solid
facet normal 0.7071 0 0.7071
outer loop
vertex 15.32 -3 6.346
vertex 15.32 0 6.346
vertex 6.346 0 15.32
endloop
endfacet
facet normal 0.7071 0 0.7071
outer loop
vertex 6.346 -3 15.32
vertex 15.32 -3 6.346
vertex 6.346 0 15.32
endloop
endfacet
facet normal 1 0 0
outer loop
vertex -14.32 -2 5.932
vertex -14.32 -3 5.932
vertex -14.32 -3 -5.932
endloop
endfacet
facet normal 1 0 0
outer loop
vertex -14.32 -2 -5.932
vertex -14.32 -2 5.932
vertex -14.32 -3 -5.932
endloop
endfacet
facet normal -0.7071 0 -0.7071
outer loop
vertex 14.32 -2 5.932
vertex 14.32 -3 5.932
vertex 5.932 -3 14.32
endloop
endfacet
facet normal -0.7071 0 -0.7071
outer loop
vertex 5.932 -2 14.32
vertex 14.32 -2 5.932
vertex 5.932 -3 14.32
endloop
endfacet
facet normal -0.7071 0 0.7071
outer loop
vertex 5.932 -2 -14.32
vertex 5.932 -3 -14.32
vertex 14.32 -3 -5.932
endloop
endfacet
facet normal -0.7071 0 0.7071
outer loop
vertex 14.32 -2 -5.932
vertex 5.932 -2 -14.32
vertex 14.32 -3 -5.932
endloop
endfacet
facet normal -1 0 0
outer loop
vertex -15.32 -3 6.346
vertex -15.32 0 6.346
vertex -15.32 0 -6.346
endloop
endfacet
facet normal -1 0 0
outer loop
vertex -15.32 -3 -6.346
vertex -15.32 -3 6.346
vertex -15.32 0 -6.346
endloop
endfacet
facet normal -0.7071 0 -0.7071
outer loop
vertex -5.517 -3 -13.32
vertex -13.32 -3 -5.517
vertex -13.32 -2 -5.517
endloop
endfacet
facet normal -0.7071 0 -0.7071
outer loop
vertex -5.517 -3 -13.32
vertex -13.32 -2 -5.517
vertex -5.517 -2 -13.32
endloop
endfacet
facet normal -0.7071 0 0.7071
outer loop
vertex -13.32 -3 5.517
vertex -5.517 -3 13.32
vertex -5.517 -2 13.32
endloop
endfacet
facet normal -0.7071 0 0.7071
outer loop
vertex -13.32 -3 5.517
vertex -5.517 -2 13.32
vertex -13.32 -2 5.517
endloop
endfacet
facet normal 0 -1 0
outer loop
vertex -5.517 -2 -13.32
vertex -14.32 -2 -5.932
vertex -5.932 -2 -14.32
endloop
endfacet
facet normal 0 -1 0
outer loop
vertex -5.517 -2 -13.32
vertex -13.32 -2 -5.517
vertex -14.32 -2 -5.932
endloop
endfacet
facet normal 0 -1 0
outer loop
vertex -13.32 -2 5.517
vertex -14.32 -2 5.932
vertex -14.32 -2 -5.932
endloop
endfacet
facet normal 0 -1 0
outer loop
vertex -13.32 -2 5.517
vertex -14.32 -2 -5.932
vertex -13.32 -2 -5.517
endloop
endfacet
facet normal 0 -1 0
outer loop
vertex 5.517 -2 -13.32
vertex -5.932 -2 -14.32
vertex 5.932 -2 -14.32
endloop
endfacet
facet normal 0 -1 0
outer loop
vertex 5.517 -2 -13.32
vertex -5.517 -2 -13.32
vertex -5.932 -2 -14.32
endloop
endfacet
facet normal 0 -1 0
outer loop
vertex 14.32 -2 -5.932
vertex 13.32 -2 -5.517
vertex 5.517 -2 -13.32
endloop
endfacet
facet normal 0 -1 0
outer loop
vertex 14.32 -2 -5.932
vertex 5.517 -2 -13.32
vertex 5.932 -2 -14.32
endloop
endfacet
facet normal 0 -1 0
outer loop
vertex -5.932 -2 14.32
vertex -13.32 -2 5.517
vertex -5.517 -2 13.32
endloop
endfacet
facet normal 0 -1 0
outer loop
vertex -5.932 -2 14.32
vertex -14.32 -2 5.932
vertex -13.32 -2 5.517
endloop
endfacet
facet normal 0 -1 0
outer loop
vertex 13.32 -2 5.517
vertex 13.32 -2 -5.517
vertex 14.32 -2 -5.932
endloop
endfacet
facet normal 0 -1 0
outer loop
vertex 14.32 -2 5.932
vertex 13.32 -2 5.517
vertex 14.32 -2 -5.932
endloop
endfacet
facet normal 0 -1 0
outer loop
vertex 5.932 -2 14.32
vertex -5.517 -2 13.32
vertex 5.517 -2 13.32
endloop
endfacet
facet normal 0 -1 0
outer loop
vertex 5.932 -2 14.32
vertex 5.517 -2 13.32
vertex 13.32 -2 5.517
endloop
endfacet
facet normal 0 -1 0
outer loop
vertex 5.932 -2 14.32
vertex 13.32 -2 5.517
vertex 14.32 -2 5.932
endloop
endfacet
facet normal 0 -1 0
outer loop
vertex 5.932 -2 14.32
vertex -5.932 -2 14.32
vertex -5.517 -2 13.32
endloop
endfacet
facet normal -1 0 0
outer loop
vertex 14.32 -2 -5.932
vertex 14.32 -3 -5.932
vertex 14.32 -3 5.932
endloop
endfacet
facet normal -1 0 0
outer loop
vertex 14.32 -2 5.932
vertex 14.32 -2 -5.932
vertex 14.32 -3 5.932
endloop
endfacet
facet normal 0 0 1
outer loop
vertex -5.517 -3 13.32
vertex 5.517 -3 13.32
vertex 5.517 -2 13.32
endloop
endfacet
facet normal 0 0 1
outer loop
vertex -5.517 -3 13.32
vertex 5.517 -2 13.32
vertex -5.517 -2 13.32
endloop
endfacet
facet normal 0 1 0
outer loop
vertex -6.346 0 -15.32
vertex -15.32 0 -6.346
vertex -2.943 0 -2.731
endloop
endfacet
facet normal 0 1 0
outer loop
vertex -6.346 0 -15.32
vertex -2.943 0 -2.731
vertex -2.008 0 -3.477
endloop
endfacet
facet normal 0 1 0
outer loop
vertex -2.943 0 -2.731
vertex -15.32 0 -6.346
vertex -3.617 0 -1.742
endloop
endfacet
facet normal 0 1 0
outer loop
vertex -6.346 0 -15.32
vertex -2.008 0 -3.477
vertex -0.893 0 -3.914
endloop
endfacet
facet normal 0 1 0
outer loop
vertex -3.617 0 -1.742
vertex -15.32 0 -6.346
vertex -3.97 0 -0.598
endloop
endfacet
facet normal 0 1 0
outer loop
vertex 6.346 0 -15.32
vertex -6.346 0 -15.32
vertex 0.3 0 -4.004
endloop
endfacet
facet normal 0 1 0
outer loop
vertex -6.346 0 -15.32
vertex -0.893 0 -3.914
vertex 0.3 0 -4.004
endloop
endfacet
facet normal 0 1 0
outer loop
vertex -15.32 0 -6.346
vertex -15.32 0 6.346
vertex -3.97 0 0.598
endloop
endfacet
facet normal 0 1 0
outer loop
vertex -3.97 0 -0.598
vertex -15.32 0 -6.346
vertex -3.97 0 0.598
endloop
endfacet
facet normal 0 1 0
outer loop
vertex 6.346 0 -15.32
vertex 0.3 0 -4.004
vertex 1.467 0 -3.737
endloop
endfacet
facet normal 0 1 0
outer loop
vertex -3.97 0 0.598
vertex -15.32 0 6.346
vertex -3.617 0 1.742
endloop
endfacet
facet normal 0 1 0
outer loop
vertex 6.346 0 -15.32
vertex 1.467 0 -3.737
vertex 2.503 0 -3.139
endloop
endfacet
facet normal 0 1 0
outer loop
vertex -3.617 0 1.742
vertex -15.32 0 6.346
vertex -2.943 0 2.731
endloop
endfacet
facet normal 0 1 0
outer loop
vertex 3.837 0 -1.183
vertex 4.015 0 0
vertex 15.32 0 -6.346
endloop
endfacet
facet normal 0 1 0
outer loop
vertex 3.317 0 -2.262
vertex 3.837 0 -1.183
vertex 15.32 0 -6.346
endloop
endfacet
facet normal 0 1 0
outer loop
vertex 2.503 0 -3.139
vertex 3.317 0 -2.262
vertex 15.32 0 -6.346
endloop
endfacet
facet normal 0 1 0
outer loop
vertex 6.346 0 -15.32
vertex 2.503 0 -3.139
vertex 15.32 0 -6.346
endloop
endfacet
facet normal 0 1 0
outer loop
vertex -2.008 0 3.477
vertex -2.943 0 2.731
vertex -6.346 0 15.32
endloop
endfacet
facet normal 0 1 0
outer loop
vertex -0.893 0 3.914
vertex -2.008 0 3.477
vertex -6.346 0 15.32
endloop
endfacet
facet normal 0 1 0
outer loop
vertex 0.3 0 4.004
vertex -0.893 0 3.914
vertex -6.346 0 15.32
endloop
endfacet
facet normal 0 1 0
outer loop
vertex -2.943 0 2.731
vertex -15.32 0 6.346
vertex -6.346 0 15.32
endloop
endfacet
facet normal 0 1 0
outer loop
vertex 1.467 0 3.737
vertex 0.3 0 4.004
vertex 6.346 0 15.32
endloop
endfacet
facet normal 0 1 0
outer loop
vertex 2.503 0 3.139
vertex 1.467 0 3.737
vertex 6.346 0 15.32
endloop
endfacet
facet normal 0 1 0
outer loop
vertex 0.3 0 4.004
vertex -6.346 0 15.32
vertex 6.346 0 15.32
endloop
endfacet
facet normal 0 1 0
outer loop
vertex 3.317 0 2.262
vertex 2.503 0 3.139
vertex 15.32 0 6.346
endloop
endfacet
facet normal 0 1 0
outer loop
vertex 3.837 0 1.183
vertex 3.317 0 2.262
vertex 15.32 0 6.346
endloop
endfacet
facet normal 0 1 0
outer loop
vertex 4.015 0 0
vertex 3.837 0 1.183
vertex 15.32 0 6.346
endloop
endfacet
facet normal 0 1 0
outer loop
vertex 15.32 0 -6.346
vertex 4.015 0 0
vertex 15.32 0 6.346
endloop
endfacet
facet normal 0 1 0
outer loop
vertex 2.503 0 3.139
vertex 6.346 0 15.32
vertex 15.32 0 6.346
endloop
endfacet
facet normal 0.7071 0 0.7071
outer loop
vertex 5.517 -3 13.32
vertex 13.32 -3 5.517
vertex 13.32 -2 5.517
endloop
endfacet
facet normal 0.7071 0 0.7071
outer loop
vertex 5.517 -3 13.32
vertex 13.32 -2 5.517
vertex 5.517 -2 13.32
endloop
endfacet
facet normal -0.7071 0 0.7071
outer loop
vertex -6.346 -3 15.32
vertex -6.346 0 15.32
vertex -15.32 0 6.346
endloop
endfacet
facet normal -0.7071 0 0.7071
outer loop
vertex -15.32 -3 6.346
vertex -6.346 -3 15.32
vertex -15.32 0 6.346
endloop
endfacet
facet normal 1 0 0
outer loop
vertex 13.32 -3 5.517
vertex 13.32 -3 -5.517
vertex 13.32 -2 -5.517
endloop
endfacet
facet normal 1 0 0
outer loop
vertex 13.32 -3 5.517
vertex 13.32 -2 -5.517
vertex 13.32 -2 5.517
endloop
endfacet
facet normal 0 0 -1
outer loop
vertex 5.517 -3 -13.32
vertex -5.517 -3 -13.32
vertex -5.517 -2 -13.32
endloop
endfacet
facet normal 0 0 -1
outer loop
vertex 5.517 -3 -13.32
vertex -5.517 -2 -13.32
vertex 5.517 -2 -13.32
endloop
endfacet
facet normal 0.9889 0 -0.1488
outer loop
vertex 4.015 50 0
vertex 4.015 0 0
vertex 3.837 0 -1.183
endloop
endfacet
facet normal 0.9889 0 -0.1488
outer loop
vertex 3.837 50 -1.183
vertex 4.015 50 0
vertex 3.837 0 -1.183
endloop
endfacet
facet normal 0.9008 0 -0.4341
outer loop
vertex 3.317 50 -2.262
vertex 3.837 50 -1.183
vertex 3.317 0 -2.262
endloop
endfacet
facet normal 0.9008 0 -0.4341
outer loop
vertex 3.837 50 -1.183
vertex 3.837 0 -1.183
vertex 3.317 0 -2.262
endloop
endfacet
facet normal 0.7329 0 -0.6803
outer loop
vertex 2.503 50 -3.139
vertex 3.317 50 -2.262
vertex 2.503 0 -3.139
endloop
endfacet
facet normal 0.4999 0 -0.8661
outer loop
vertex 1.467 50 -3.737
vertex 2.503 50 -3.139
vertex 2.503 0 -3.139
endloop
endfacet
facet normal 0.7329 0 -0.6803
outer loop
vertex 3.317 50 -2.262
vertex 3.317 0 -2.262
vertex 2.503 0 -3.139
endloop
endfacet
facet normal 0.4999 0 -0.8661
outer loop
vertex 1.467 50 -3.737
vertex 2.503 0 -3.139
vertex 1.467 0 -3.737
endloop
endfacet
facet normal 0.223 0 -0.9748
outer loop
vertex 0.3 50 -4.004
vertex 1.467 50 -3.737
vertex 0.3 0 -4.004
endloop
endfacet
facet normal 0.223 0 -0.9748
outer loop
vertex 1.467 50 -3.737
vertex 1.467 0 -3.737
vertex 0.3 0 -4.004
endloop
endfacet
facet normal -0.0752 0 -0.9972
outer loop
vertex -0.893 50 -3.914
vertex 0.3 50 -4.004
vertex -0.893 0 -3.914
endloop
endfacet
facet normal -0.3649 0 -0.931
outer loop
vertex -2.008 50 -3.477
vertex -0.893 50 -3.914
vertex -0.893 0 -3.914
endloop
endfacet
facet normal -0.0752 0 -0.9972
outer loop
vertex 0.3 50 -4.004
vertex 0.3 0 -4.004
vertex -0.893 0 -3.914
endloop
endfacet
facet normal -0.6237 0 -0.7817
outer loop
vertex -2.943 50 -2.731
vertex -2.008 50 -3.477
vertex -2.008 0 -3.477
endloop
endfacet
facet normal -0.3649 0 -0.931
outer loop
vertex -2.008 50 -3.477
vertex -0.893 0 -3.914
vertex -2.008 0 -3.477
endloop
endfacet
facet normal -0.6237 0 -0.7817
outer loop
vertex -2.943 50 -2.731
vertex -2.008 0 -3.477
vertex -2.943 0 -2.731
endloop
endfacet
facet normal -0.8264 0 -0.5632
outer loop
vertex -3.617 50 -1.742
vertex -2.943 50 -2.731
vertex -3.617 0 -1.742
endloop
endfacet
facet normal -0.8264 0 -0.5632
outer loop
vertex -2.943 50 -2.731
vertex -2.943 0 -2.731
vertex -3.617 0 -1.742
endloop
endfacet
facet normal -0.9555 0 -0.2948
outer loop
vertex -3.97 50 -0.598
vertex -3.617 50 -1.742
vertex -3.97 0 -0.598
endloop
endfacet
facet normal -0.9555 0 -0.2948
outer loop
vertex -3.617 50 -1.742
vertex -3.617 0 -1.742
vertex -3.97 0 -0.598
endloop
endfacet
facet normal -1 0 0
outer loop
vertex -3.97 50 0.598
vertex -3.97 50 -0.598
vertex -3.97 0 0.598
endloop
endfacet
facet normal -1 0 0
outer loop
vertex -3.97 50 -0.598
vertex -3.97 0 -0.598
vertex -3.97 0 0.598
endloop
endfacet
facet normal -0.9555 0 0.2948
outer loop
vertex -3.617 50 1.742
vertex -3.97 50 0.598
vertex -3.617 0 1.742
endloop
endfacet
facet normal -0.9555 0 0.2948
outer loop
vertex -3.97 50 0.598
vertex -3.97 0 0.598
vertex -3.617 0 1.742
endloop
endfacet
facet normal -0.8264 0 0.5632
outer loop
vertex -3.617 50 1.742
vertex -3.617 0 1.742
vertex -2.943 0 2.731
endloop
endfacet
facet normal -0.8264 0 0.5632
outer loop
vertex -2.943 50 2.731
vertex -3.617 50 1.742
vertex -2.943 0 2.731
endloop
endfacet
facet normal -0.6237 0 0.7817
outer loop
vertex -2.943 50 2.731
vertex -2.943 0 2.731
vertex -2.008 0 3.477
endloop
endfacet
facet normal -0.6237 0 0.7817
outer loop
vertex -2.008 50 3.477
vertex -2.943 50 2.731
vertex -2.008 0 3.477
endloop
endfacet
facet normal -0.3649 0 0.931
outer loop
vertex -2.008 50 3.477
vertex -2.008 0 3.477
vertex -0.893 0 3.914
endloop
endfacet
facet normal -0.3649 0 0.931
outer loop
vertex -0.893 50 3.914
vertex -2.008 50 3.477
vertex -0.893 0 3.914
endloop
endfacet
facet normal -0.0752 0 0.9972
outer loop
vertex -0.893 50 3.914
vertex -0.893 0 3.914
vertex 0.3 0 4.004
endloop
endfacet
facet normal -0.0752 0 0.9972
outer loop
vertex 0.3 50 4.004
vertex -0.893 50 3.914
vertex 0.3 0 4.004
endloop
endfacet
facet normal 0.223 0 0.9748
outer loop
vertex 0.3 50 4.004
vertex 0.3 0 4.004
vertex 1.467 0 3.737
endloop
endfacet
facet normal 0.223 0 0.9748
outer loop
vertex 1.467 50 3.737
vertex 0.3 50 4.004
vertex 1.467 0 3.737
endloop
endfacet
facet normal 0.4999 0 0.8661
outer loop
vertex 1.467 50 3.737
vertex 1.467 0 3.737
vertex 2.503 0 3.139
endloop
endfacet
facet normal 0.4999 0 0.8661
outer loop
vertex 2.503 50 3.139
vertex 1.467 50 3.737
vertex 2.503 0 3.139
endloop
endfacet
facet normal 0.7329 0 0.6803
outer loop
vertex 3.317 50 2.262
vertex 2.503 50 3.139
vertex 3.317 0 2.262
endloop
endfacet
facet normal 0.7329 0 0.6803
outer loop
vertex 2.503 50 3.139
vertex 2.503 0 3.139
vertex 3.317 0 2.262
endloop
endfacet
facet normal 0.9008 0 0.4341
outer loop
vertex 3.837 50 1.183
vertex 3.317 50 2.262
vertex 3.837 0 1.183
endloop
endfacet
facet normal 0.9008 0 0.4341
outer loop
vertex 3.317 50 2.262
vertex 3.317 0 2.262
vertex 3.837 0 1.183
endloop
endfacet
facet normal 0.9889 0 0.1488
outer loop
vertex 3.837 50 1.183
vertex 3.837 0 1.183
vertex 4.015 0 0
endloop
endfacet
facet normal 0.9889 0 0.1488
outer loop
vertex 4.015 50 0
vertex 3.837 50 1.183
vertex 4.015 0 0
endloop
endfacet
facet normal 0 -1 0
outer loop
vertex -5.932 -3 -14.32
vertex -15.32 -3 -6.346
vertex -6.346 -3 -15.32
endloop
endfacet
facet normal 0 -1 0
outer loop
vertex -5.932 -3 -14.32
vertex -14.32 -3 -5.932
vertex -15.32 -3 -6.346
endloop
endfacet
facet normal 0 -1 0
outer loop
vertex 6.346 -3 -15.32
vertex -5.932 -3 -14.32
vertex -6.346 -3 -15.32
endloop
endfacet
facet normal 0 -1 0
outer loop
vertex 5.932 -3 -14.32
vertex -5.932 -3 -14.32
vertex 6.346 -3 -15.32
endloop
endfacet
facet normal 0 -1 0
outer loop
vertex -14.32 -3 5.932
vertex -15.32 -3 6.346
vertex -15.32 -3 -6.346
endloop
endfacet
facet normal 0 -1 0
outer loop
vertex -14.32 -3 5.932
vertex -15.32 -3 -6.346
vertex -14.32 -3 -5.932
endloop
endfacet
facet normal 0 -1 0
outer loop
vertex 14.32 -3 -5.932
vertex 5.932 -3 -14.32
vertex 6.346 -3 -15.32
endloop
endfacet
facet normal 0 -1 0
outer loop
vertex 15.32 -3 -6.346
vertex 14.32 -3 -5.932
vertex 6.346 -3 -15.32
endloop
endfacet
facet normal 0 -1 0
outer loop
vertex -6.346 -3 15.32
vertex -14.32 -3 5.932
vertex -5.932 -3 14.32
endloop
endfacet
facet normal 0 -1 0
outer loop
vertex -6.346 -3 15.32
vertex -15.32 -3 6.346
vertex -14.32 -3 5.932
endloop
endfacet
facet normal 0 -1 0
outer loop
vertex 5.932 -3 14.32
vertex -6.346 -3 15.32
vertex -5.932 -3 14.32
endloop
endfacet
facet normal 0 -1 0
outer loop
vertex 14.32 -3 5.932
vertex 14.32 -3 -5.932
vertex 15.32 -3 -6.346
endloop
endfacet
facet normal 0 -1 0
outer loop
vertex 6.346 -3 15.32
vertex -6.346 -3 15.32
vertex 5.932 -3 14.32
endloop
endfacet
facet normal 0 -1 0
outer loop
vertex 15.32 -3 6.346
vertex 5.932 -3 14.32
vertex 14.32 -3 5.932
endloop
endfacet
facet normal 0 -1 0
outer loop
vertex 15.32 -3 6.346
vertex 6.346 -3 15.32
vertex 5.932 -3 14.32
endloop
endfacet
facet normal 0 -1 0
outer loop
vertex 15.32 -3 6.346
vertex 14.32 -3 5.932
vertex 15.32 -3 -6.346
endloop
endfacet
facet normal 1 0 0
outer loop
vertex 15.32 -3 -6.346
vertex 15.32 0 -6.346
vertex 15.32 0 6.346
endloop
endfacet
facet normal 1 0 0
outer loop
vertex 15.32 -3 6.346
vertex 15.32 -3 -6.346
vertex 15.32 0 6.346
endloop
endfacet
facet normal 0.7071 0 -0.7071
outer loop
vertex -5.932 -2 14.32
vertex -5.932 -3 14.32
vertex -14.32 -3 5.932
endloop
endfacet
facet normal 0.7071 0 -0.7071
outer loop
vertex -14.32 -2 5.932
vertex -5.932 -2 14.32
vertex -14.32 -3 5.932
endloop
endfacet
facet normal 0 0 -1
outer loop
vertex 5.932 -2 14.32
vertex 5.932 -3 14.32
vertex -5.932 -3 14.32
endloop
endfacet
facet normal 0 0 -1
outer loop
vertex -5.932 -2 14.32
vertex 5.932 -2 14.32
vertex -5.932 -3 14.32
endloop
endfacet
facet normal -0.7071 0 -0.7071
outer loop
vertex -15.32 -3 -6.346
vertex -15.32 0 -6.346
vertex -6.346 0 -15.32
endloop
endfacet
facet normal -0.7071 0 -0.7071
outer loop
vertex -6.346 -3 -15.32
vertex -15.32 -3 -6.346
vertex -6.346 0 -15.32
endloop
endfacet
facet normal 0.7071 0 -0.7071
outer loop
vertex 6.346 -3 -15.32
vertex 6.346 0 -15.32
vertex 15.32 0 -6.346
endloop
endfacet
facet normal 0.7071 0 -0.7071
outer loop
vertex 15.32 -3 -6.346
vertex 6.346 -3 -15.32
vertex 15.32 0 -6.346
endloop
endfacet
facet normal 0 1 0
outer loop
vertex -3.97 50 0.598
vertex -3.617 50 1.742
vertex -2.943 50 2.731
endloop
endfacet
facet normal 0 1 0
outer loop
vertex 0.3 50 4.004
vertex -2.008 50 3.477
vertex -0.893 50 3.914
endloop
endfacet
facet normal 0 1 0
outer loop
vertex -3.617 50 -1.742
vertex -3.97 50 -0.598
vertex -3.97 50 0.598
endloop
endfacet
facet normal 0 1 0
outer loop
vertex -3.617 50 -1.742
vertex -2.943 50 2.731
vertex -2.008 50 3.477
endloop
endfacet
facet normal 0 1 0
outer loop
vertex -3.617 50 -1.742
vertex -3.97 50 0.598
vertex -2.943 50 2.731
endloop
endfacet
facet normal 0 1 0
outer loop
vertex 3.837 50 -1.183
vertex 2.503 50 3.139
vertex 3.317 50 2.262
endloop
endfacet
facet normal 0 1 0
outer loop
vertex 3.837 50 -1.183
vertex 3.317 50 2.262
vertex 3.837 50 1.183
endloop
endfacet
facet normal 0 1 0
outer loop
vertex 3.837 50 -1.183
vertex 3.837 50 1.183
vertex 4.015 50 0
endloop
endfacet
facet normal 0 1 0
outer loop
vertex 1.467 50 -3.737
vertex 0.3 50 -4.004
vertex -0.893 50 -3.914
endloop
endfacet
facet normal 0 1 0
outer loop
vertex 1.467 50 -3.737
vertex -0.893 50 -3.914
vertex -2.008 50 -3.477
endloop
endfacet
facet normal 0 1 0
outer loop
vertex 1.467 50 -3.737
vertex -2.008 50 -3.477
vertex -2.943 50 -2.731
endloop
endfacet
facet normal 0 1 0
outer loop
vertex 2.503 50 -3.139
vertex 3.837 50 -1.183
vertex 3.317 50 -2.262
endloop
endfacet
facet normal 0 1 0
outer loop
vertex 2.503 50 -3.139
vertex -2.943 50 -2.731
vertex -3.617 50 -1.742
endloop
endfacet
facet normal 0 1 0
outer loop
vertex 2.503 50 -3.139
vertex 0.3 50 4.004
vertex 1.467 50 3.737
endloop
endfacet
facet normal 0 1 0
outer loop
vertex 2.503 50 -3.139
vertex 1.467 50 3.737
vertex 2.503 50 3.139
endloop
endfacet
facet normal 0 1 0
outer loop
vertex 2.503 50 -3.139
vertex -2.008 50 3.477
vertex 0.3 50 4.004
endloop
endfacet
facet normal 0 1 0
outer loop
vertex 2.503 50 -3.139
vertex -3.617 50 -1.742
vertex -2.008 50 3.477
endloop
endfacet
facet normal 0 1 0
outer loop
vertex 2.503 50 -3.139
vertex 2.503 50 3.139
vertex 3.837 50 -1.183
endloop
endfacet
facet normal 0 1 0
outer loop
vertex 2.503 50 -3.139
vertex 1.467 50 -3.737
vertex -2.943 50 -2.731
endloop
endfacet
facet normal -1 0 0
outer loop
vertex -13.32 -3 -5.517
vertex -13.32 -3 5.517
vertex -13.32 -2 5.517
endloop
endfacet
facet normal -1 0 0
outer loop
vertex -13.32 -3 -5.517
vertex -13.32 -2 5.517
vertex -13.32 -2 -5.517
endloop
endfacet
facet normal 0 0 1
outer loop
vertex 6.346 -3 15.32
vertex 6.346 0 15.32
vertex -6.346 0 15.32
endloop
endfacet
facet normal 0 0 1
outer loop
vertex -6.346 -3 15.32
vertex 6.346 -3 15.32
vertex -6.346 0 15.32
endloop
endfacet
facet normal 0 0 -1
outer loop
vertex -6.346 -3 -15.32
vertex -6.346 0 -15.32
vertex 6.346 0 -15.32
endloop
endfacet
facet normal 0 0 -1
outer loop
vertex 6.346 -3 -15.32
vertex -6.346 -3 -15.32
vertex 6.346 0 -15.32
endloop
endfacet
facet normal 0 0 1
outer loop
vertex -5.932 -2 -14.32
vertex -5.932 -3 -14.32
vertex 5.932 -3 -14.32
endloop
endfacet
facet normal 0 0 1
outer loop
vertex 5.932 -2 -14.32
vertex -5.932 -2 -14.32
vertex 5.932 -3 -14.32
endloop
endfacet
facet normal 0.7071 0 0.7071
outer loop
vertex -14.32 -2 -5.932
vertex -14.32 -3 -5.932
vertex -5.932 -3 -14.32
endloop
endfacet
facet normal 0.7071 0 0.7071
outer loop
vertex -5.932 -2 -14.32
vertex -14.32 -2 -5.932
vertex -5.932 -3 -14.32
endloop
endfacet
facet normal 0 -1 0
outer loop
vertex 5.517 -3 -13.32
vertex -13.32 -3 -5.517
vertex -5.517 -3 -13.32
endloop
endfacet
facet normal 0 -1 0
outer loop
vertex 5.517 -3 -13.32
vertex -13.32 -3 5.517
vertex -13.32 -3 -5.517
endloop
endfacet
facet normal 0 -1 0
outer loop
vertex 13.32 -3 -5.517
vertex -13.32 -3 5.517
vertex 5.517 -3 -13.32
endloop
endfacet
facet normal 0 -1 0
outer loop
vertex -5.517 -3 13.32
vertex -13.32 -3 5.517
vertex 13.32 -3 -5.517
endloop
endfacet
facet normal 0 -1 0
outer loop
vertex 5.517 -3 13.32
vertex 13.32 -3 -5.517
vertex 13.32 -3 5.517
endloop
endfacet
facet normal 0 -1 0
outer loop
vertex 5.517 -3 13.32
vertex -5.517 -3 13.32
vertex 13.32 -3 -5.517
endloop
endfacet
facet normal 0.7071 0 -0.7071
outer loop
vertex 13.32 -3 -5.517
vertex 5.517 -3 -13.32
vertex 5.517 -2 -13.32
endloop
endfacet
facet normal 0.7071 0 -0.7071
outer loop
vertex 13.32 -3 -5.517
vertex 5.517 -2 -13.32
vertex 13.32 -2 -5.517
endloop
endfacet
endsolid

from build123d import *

# Parameters (mm, degrees)
SKETCH_1_R          = 4.015
EXTRUDE_1_DEPTH     = 50
EXTRUDE_2_DEPTH     = 3
CUT_EXTRUDE_1_DEPTH = 1


with BuildPart() as part:
    # 스케치1 → 보스-돌출1 (new body)
    with BuildSketch(Plane(origin=(0, 0, 0), x_dir=(1, 0, 0), z_dir=(0, 1, 0))):
        Circle(SKETCH_1_R)
    extrude(amount=EXTRUDE_1_DEPTH)

    # 스케치2 → 보스-돌출2 (add)
    with BuildSketch(Plane.XZ):
        Polygon((6.345806764, -15.320132754), (15.320132754, -6.345806764), (15.320132754, 6.345806764), (6.345806764, 15.320132754), (-6.345806764, 15.320132754), (-15.320132754, 6.345806764), (-15.320132754, -6.345806764), (-6.345806764, -15.320132754), align=None)
    extrude(amount=EXTRUDE_2_DEPTH)

    # 스케치3 → 컷-돌출1 (cut)
    with BuildSketch(Plane.XZ.offset(3)):
        Polygon((-14.320132754, -5.931593202), (-5.931593202, -14.320132754), (5.931593202, -14.320132754), (14.320132754, -5.931593202), (14.320132754, 5.931593202), (5.931593202, 14.320132754), (-5.931593202, 14.320132754), (-14.320132754, 5.931593202), align=None)
        Polygon((-5.517379639, -13.320132754), (5.517379639, -13.320132754), (13.320132754, -5.517379639), (13.320132754, 5.517379639), (5.517379639, 13.320132754), (-5.517379639, 13.320132754), (-13.320132754, 5.517379639), (-13.320132754, -5.517379639), align=None, mode=Mode.SUBTRACT)
    extrude(amount=-CUT_EXTRUDE_1_DEPTH, mode=Mode.SUBTRACT)


solid = part.part
